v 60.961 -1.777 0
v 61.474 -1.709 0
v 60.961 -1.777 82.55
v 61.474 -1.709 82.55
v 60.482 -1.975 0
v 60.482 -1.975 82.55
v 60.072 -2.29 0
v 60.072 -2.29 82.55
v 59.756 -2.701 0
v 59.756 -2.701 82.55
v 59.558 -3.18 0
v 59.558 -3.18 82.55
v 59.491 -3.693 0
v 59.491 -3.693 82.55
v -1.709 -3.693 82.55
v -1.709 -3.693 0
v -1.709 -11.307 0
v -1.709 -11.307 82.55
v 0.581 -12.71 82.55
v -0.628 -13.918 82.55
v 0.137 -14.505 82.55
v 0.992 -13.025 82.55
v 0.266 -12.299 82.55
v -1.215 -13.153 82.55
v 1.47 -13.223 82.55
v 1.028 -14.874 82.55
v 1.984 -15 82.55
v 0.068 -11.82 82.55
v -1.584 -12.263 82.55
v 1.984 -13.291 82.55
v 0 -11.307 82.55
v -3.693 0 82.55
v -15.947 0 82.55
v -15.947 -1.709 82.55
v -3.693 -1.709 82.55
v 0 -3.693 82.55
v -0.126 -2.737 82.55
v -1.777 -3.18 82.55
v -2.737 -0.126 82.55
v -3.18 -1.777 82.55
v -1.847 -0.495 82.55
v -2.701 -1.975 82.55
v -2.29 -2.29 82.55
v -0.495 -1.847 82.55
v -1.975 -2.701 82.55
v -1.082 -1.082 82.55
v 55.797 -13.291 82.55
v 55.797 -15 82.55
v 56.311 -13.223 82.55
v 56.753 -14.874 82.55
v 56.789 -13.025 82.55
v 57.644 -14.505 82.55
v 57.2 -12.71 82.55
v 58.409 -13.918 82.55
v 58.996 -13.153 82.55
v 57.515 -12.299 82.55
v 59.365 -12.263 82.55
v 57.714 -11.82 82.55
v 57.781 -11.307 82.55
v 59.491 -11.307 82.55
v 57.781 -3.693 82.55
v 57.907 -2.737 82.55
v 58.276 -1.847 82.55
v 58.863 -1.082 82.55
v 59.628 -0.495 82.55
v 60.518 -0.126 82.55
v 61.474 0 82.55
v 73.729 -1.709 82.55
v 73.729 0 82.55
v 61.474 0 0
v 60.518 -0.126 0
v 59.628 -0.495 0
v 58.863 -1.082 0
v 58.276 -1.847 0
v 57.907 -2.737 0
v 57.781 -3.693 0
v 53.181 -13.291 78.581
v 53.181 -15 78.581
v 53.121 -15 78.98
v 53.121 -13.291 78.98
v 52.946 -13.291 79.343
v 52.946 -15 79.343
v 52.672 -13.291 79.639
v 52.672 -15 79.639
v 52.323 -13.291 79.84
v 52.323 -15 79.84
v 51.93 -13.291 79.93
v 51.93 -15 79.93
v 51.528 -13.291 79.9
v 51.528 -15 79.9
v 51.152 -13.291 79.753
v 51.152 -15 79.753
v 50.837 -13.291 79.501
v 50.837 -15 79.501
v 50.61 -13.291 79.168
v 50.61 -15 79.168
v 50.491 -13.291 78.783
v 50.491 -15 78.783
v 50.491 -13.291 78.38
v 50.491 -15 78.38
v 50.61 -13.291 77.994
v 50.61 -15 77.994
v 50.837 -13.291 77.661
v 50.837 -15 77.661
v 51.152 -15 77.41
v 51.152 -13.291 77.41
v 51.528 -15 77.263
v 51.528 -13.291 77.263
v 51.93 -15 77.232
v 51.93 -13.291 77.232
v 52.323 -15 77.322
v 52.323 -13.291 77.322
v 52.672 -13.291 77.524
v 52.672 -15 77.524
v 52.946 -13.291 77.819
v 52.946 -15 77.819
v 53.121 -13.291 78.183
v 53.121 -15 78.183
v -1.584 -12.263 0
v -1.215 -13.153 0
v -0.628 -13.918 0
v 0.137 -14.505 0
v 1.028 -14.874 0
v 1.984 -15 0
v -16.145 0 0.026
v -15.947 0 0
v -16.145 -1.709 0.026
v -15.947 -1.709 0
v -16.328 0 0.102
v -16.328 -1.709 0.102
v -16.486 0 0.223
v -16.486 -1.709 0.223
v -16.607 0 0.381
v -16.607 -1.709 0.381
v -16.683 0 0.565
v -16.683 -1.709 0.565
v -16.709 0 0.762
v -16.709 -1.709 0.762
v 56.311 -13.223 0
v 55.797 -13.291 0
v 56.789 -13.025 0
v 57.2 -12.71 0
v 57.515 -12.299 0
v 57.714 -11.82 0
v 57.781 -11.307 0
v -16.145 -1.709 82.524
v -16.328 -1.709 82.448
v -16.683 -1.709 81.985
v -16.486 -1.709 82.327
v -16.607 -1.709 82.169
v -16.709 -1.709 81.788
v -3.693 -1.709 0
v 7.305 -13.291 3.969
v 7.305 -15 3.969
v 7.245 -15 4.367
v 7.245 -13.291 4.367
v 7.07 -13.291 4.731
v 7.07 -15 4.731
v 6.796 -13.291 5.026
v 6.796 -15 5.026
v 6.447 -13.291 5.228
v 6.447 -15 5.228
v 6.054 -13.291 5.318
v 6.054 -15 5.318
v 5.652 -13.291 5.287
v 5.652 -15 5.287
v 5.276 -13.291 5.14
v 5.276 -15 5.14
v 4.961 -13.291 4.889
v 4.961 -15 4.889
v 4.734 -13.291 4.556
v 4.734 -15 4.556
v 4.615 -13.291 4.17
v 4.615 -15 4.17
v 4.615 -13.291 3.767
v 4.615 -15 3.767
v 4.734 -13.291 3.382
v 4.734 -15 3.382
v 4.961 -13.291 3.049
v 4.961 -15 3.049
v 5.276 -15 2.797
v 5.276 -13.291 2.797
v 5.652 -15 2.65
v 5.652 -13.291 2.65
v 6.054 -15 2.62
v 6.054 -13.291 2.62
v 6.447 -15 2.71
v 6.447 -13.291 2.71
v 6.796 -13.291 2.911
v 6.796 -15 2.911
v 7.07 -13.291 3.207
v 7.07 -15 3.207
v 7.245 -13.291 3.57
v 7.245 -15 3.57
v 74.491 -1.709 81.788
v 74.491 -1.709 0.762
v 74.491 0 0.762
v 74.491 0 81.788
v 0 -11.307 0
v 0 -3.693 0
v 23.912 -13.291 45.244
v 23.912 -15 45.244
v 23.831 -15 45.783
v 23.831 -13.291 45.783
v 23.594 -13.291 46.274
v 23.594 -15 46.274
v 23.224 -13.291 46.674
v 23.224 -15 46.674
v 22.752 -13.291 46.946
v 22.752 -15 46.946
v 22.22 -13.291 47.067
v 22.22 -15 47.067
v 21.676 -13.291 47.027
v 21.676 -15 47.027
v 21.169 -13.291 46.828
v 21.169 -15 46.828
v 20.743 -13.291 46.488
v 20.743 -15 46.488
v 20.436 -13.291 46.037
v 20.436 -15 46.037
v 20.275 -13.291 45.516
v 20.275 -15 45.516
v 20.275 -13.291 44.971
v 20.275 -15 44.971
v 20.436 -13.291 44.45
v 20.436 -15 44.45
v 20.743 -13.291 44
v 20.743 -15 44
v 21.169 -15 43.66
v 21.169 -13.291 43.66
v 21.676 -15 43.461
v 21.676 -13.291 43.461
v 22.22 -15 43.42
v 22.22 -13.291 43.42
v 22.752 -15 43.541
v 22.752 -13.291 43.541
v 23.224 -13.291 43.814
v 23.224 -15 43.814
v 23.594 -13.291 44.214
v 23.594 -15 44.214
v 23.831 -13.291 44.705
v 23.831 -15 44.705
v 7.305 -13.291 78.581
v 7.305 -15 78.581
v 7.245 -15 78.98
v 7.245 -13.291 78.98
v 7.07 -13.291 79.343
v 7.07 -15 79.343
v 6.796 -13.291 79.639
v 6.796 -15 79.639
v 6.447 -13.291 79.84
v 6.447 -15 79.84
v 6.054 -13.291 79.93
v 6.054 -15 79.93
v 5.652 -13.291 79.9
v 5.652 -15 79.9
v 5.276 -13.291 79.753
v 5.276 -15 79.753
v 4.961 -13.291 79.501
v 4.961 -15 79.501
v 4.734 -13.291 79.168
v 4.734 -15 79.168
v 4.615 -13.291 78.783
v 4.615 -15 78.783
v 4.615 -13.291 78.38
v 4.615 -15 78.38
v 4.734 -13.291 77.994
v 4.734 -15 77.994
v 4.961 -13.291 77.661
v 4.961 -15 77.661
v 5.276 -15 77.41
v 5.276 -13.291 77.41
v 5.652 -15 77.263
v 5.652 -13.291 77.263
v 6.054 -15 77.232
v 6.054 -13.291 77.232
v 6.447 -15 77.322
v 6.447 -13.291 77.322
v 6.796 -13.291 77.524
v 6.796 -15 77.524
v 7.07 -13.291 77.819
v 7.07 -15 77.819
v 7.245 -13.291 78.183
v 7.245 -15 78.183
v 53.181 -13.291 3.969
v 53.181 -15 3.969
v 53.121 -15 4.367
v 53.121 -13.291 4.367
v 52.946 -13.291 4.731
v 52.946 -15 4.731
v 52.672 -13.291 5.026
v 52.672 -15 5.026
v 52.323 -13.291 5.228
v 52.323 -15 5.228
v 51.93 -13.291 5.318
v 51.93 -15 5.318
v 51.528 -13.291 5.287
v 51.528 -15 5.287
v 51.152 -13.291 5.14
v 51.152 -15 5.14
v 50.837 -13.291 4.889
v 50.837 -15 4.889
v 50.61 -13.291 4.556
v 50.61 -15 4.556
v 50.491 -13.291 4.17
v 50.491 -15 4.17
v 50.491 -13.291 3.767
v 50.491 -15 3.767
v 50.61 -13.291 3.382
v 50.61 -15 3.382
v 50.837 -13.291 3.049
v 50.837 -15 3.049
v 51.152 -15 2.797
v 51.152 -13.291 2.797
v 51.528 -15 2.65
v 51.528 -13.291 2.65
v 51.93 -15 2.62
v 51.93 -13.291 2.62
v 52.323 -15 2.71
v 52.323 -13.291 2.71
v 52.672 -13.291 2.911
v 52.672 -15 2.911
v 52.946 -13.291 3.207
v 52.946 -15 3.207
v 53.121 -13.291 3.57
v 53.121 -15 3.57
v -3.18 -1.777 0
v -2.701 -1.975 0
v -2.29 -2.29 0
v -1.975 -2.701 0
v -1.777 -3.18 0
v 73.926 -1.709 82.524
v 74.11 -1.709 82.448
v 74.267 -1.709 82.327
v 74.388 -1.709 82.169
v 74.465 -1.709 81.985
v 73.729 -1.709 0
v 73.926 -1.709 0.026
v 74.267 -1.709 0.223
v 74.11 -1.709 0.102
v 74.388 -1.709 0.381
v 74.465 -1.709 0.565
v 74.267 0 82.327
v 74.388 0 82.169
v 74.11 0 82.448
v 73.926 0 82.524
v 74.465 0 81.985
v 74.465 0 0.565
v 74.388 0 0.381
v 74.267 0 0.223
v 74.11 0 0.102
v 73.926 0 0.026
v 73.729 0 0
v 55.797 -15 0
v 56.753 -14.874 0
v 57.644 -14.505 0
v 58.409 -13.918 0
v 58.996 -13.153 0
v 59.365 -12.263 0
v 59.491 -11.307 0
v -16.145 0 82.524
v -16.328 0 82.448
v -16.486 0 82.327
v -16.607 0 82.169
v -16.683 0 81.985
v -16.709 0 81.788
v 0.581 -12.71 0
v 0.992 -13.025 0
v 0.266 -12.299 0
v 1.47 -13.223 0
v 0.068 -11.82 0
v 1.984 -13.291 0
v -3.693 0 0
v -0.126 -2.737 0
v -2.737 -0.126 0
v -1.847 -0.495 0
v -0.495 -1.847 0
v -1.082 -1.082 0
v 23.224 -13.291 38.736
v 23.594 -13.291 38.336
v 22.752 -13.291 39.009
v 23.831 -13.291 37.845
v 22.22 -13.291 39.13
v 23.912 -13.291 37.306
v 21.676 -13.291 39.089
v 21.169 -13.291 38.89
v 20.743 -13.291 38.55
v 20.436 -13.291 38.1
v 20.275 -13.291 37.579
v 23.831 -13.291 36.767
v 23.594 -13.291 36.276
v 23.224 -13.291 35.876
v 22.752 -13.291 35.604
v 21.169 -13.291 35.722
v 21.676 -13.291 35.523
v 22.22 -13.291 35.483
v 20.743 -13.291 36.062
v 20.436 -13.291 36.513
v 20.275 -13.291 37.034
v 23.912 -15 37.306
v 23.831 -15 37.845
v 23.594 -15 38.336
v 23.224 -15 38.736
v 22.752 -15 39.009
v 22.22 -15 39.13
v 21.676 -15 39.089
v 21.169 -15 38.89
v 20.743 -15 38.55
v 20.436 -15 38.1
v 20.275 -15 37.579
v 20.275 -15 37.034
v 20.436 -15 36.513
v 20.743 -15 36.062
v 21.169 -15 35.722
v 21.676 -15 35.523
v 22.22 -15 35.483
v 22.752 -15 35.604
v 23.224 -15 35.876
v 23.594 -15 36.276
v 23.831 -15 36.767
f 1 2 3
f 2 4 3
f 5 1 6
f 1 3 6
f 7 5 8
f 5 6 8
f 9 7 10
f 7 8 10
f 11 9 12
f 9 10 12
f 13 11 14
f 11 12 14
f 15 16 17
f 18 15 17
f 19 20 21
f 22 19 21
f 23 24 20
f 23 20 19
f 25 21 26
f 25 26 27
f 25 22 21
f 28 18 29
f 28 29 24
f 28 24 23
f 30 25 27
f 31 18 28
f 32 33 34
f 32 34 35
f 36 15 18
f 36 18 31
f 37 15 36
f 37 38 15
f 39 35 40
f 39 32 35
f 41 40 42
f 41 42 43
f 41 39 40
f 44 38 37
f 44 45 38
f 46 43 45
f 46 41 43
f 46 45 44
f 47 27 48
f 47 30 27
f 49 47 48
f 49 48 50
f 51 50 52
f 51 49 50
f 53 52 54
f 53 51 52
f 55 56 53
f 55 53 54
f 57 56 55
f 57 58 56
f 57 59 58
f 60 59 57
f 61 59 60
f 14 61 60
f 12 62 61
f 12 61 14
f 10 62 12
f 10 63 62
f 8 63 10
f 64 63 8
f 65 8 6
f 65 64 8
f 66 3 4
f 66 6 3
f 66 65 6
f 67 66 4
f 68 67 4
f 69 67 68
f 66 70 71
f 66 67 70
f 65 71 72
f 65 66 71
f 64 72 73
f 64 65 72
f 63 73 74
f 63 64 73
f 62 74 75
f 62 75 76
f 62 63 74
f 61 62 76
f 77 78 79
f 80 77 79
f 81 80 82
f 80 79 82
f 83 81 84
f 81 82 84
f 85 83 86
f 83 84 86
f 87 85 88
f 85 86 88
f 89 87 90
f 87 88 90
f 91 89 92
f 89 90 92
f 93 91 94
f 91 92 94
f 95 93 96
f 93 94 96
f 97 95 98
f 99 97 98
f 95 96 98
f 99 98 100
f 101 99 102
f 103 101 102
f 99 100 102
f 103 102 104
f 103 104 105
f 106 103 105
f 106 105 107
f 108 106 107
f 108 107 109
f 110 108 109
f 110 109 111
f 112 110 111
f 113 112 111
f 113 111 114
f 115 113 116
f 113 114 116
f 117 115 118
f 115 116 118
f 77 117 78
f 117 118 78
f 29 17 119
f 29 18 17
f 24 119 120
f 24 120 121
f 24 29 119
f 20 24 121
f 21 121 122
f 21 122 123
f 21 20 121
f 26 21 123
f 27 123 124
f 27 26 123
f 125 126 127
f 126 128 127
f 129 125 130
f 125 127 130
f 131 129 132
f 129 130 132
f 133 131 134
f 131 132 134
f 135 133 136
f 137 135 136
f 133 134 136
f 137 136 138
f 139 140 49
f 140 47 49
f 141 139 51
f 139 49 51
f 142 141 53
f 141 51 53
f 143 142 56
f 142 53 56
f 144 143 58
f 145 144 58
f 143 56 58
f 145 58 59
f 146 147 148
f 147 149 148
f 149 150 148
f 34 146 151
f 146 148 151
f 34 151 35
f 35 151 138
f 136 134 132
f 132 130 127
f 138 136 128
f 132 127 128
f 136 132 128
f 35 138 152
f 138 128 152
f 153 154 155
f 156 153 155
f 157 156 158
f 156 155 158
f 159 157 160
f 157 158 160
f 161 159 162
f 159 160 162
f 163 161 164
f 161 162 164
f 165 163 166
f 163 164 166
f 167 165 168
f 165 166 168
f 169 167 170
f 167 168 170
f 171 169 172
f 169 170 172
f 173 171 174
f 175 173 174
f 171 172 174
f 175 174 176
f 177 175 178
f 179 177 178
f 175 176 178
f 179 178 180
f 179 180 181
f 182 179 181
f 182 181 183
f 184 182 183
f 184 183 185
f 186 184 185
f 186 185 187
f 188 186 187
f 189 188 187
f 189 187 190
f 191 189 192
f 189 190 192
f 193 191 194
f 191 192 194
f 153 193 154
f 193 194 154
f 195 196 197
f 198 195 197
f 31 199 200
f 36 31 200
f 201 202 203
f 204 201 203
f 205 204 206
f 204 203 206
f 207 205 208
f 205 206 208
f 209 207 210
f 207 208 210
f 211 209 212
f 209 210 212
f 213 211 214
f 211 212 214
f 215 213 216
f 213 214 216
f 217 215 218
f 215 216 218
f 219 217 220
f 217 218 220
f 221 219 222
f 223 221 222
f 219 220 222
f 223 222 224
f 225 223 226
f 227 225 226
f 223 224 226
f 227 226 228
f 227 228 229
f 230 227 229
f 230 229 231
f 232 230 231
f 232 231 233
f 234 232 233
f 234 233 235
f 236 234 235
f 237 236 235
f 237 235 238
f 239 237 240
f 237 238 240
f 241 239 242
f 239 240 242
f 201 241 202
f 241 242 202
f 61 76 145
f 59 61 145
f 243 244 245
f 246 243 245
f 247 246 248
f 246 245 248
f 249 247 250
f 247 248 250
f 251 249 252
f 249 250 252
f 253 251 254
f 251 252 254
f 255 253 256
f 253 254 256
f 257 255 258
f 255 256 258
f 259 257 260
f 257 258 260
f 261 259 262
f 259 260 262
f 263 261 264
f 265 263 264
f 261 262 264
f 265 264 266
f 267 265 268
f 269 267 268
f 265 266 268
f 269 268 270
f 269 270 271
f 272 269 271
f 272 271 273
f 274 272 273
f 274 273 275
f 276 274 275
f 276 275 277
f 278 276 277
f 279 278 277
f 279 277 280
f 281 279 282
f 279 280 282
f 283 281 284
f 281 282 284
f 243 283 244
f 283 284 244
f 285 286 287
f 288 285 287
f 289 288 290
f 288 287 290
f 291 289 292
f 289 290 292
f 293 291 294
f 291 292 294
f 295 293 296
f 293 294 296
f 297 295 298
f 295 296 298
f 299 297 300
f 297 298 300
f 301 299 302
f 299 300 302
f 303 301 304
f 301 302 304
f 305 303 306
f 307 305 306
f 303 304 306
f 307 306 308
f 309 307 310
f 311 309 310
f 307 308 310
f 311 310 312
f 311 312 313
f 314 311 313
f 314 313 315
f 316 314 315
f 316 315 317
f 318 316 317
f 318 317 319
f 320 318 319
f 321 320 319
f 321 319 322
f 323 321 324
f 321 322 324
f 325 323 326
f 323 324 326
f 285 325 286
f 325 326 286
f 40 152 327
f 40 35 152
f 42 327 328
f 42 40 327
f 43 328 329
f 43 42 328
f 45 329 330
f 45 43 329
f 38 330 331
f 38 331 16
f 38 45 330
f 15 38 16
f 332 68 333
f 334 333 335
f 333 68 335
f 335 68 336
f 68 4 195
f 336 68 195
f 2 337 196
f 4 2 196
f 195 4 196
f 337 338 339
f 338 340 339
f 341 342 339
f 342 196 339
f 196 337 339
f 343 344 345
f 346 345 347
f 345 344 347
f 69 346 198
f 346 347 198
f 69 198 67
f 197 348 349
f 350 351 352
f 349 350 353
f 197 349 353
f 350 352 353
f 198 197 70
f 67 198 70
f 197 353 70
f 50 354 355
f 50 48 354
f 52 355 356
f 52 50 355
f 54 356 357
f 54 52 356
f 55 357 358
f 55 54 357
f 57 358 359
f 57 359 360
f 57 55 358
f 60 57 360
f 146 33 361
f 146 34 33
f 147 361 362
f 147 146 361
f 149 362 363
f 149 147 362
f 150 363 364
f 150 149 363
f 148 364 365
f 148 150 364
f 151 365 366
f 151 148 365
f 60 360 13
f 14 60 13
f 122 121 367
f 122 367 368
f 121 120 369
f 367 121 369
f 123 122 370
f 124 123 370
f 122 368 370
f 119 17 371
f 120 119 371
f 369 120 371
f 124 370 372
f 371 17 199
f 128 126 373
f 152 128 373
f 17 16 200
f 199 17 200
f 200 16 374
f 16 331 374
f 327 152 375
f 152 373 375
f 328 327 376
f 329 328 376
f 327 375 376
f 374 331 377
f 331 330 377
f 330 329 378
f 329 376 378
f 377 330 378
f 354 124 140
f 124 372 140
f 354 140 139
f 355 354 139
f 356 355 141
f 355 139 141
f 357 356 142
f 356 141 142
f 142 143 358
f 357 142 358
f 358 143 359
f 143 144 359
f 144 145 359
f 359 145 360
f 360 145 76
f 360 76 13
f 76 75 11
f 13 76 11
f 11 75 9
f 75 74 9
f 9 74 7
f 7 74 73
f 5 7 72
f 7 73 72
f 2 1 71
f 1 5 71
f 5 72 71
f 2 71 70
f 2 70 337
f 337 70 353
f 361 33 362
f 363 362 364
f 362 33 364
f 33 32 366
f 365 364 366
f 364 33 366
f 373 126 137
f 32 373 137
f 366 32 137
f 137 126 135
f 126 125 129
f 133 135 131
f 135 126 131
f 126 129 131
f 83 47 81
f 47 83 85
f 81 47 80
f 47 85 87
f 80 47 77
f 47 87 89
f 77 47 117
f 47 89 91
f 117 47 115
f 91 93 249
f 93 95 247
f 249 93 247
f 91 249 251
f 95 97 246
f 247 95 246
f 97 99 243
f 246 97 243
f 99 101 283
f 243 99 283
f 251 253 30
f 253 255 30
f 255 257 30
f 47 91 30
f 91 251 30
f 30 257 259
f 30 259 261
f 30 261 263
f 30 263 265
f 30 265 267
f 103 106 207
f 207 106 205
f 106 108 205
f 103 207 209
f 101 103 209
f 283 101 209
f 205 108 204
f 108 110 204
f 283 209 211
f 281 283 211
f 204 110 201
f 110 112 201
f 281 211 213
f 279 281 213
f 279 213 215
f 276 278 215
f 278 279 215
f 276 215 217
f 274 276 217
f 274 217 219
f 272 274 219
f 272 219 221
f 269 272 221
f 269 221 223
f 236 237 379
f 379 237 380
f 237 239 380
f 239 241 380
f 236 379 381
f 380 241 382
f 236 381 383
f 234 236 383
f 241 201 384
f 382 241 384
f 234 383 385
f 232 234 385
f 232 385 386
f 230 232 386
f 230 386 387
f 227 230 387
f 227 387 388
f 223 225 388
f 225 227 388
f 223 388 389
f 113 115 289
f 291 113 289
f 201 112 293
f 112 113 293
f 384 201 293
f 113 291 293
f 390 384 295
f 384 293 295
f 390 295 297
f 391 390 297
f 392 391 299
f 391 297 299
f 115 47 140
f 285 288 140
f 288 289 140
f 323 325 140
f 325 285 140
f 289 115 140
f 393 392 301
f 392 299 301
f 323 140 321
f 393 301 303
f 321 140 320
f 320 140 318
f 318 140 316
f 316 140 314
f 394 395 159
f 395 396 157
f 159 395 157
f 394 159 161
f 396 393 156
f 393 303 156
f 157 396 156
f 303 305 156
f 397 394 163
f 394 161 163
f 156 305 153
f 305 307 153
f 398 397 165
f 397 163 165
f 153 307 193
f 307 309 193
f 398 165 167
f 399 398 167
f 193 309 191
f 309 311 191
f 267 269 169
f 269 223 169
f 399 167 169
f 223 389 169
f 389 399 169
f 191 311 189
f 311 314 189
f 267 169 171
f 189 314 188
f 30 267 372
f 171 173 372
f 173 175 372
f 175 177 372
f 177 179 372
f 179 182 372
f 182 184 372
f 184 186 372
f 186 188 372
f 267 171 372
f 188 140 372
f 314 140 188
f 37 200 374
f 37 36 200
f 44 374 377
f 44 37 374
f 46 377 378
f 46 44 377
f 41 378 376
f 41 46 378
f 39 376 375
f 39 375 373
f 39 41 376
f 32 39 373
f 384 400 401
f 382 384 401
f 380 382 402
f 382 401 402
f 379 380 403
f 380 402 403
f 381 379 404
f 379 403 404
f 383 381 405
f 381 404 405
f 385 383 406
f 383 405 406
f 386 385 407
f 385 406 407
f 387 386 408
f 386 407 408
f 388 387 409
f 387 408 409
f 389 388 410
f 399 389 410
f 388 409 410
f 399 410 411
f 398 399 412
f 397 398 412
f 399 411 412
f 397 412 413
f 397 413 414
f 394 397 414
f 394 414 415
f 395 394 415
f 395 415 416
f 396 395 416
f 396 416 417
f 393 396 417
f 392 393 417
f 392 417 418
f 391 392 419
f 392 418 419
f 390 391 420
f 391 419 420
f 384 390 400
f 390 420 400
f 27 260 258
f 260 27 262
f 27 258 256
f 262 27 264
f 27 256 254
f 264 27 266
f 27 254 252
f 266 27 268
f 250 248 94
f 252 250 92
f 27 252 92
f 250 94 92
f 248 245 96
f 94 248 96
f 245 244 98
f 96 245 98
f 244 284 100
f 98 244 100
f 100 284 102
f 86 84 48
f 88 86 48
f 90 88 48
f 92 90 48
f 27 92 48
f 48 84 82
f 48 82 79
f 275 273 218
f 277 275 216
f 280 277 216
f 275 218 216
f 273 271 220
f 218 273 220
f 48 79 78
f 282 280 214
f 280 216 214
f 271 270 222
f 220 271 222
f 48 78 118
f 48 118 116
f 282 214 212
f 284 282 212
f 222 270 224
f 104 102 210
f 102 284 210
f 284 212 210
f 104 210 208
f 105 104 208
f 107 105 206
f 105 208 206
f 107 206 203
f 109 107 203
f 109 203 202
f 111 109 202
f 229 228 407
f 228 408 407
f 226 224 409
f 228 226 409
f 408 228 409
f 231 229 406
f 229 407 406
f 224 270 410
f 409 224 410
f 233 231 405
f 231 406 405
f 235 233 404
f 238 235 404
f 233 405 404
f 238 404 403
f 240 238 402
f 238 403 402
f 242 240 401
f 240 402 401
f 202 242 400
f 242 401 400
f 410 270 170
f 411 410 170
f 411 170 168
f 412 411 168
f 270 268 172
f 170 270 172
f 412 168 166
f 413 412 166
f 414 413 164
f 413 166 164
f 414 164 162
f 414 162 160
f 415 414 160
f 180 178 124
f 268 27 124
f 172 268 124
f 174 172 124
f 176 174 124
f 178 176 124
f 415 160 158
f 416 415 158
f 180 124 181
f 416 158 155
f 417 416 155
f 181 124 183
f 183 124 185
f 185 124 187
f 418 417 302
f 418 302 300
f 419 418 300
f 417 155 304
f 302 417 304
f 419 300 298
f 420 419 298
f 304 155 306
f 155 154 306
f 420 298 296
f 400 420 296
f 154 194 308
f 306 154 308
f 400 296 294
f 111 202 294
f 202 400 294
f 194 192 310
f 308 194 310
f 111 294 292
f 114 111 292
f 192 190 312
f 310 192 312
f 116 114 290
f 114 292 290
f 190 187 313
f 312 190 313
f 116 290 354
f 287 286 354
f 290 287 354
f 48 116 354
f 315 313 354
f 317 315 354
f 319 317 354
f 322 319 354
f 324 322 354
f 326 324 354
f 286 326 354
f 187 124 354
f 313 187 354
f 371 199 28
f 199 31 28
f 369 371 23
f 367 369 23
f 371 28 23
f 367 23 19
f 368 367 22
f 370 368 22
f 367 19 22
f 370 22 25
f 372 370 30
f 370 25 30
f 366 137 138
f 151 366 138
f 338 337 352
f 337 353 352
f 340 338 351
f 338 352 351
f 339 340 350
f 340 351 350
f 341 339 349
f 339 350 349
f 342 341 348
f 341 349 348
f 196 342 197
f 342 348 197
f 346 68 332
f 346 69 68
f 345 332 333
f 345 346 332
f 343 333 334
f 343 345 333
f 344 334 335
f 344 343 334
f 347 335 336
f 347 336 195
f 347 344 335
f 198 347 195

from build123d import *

# Parameters (mm, degrees)
F1_DEPTH = 82.55
F2_R     = 3.69316
F3_R     = 1.98374
F4_R     = 1.35255
F4_R_2   = 1.8288
F5_DEPTH = 1.70942
F6_R     = 0.762


with BuildPart() as f1:
    # F0 (on Top) → F1 (new body)
    with BuildSketch(Plane.XY):
        Polygon((0, -13.290575), (0, 0), (-16.70942, 0), (-16.70942, -1.70942), (-1.70942, -1.70942), (-1.70942, -14.999995), (59.49058, -14.999995), (59.49058, -1.70942), (74.49058, -1.70942), (74.49058, 0), (57.78116, 0), (57.78116, -13.290575), align=None)
    extrude(amount=F1_DEPTH)

    # F2
    f2_edges = [f1.edges().sort_by_distance(p)[0] for p in [
        (59.49058, -14.999995, 41.275),
        (-1.70942, -14.999995, 41.275),
        (0, 0, 41.275),
        (57.78116, 0, 41.275),
    ]]
    fillet(f2_edges, radius=F2_R)

    # F3
    f3_edges = [f1.edges().sort_by_distance(p)[0] for p in [
        (0, -13.290575, 41.275),
        (57.78116, -13.290575, 41.275),
        (59.49058, -1.70942, 41.275),
        (-1.70942, -1.70942, 41.275),
    ]]
    fillet(f3_edges, radius=F3_R)

    # F4 (on face) → F5 (cut, through all)
    with BuildSketch(Plane.XZ.offset(14.999995)):
        with Locations((51.82867, 78.58125)):
            Circle(F4_R)
        with Locations((5.95249, 78.58125)):
            Circle(F4_R)
        with Locations((5.95249, 3.96875)):
            Circle(F4_R)
        with Locations((51.82867, 3.96875)):
            Circle(F4_R)
        with Locations((22.08338, 37.30625)):
            Circle(F4_R_2)
        with Locations((22.08338, 45.24375)):
            Circle(F4_R_2)
    extrude(amount=-F5_DEPTH, mode=Mode.SUBTRACT)

    # F6
    f6_edges = [f1.edges().sort_by_distance(p)[0] for p in [
        (-16.70942, -0.85471, 82.55),
        (-16.70942, -0.85471, 0),
        (74.49058, -0.85471, 0),
        (74.49058, -0.85471, 82.55),
    ]]
    fillet(f6_edges, radius=F6_R)


solid = f1.part
